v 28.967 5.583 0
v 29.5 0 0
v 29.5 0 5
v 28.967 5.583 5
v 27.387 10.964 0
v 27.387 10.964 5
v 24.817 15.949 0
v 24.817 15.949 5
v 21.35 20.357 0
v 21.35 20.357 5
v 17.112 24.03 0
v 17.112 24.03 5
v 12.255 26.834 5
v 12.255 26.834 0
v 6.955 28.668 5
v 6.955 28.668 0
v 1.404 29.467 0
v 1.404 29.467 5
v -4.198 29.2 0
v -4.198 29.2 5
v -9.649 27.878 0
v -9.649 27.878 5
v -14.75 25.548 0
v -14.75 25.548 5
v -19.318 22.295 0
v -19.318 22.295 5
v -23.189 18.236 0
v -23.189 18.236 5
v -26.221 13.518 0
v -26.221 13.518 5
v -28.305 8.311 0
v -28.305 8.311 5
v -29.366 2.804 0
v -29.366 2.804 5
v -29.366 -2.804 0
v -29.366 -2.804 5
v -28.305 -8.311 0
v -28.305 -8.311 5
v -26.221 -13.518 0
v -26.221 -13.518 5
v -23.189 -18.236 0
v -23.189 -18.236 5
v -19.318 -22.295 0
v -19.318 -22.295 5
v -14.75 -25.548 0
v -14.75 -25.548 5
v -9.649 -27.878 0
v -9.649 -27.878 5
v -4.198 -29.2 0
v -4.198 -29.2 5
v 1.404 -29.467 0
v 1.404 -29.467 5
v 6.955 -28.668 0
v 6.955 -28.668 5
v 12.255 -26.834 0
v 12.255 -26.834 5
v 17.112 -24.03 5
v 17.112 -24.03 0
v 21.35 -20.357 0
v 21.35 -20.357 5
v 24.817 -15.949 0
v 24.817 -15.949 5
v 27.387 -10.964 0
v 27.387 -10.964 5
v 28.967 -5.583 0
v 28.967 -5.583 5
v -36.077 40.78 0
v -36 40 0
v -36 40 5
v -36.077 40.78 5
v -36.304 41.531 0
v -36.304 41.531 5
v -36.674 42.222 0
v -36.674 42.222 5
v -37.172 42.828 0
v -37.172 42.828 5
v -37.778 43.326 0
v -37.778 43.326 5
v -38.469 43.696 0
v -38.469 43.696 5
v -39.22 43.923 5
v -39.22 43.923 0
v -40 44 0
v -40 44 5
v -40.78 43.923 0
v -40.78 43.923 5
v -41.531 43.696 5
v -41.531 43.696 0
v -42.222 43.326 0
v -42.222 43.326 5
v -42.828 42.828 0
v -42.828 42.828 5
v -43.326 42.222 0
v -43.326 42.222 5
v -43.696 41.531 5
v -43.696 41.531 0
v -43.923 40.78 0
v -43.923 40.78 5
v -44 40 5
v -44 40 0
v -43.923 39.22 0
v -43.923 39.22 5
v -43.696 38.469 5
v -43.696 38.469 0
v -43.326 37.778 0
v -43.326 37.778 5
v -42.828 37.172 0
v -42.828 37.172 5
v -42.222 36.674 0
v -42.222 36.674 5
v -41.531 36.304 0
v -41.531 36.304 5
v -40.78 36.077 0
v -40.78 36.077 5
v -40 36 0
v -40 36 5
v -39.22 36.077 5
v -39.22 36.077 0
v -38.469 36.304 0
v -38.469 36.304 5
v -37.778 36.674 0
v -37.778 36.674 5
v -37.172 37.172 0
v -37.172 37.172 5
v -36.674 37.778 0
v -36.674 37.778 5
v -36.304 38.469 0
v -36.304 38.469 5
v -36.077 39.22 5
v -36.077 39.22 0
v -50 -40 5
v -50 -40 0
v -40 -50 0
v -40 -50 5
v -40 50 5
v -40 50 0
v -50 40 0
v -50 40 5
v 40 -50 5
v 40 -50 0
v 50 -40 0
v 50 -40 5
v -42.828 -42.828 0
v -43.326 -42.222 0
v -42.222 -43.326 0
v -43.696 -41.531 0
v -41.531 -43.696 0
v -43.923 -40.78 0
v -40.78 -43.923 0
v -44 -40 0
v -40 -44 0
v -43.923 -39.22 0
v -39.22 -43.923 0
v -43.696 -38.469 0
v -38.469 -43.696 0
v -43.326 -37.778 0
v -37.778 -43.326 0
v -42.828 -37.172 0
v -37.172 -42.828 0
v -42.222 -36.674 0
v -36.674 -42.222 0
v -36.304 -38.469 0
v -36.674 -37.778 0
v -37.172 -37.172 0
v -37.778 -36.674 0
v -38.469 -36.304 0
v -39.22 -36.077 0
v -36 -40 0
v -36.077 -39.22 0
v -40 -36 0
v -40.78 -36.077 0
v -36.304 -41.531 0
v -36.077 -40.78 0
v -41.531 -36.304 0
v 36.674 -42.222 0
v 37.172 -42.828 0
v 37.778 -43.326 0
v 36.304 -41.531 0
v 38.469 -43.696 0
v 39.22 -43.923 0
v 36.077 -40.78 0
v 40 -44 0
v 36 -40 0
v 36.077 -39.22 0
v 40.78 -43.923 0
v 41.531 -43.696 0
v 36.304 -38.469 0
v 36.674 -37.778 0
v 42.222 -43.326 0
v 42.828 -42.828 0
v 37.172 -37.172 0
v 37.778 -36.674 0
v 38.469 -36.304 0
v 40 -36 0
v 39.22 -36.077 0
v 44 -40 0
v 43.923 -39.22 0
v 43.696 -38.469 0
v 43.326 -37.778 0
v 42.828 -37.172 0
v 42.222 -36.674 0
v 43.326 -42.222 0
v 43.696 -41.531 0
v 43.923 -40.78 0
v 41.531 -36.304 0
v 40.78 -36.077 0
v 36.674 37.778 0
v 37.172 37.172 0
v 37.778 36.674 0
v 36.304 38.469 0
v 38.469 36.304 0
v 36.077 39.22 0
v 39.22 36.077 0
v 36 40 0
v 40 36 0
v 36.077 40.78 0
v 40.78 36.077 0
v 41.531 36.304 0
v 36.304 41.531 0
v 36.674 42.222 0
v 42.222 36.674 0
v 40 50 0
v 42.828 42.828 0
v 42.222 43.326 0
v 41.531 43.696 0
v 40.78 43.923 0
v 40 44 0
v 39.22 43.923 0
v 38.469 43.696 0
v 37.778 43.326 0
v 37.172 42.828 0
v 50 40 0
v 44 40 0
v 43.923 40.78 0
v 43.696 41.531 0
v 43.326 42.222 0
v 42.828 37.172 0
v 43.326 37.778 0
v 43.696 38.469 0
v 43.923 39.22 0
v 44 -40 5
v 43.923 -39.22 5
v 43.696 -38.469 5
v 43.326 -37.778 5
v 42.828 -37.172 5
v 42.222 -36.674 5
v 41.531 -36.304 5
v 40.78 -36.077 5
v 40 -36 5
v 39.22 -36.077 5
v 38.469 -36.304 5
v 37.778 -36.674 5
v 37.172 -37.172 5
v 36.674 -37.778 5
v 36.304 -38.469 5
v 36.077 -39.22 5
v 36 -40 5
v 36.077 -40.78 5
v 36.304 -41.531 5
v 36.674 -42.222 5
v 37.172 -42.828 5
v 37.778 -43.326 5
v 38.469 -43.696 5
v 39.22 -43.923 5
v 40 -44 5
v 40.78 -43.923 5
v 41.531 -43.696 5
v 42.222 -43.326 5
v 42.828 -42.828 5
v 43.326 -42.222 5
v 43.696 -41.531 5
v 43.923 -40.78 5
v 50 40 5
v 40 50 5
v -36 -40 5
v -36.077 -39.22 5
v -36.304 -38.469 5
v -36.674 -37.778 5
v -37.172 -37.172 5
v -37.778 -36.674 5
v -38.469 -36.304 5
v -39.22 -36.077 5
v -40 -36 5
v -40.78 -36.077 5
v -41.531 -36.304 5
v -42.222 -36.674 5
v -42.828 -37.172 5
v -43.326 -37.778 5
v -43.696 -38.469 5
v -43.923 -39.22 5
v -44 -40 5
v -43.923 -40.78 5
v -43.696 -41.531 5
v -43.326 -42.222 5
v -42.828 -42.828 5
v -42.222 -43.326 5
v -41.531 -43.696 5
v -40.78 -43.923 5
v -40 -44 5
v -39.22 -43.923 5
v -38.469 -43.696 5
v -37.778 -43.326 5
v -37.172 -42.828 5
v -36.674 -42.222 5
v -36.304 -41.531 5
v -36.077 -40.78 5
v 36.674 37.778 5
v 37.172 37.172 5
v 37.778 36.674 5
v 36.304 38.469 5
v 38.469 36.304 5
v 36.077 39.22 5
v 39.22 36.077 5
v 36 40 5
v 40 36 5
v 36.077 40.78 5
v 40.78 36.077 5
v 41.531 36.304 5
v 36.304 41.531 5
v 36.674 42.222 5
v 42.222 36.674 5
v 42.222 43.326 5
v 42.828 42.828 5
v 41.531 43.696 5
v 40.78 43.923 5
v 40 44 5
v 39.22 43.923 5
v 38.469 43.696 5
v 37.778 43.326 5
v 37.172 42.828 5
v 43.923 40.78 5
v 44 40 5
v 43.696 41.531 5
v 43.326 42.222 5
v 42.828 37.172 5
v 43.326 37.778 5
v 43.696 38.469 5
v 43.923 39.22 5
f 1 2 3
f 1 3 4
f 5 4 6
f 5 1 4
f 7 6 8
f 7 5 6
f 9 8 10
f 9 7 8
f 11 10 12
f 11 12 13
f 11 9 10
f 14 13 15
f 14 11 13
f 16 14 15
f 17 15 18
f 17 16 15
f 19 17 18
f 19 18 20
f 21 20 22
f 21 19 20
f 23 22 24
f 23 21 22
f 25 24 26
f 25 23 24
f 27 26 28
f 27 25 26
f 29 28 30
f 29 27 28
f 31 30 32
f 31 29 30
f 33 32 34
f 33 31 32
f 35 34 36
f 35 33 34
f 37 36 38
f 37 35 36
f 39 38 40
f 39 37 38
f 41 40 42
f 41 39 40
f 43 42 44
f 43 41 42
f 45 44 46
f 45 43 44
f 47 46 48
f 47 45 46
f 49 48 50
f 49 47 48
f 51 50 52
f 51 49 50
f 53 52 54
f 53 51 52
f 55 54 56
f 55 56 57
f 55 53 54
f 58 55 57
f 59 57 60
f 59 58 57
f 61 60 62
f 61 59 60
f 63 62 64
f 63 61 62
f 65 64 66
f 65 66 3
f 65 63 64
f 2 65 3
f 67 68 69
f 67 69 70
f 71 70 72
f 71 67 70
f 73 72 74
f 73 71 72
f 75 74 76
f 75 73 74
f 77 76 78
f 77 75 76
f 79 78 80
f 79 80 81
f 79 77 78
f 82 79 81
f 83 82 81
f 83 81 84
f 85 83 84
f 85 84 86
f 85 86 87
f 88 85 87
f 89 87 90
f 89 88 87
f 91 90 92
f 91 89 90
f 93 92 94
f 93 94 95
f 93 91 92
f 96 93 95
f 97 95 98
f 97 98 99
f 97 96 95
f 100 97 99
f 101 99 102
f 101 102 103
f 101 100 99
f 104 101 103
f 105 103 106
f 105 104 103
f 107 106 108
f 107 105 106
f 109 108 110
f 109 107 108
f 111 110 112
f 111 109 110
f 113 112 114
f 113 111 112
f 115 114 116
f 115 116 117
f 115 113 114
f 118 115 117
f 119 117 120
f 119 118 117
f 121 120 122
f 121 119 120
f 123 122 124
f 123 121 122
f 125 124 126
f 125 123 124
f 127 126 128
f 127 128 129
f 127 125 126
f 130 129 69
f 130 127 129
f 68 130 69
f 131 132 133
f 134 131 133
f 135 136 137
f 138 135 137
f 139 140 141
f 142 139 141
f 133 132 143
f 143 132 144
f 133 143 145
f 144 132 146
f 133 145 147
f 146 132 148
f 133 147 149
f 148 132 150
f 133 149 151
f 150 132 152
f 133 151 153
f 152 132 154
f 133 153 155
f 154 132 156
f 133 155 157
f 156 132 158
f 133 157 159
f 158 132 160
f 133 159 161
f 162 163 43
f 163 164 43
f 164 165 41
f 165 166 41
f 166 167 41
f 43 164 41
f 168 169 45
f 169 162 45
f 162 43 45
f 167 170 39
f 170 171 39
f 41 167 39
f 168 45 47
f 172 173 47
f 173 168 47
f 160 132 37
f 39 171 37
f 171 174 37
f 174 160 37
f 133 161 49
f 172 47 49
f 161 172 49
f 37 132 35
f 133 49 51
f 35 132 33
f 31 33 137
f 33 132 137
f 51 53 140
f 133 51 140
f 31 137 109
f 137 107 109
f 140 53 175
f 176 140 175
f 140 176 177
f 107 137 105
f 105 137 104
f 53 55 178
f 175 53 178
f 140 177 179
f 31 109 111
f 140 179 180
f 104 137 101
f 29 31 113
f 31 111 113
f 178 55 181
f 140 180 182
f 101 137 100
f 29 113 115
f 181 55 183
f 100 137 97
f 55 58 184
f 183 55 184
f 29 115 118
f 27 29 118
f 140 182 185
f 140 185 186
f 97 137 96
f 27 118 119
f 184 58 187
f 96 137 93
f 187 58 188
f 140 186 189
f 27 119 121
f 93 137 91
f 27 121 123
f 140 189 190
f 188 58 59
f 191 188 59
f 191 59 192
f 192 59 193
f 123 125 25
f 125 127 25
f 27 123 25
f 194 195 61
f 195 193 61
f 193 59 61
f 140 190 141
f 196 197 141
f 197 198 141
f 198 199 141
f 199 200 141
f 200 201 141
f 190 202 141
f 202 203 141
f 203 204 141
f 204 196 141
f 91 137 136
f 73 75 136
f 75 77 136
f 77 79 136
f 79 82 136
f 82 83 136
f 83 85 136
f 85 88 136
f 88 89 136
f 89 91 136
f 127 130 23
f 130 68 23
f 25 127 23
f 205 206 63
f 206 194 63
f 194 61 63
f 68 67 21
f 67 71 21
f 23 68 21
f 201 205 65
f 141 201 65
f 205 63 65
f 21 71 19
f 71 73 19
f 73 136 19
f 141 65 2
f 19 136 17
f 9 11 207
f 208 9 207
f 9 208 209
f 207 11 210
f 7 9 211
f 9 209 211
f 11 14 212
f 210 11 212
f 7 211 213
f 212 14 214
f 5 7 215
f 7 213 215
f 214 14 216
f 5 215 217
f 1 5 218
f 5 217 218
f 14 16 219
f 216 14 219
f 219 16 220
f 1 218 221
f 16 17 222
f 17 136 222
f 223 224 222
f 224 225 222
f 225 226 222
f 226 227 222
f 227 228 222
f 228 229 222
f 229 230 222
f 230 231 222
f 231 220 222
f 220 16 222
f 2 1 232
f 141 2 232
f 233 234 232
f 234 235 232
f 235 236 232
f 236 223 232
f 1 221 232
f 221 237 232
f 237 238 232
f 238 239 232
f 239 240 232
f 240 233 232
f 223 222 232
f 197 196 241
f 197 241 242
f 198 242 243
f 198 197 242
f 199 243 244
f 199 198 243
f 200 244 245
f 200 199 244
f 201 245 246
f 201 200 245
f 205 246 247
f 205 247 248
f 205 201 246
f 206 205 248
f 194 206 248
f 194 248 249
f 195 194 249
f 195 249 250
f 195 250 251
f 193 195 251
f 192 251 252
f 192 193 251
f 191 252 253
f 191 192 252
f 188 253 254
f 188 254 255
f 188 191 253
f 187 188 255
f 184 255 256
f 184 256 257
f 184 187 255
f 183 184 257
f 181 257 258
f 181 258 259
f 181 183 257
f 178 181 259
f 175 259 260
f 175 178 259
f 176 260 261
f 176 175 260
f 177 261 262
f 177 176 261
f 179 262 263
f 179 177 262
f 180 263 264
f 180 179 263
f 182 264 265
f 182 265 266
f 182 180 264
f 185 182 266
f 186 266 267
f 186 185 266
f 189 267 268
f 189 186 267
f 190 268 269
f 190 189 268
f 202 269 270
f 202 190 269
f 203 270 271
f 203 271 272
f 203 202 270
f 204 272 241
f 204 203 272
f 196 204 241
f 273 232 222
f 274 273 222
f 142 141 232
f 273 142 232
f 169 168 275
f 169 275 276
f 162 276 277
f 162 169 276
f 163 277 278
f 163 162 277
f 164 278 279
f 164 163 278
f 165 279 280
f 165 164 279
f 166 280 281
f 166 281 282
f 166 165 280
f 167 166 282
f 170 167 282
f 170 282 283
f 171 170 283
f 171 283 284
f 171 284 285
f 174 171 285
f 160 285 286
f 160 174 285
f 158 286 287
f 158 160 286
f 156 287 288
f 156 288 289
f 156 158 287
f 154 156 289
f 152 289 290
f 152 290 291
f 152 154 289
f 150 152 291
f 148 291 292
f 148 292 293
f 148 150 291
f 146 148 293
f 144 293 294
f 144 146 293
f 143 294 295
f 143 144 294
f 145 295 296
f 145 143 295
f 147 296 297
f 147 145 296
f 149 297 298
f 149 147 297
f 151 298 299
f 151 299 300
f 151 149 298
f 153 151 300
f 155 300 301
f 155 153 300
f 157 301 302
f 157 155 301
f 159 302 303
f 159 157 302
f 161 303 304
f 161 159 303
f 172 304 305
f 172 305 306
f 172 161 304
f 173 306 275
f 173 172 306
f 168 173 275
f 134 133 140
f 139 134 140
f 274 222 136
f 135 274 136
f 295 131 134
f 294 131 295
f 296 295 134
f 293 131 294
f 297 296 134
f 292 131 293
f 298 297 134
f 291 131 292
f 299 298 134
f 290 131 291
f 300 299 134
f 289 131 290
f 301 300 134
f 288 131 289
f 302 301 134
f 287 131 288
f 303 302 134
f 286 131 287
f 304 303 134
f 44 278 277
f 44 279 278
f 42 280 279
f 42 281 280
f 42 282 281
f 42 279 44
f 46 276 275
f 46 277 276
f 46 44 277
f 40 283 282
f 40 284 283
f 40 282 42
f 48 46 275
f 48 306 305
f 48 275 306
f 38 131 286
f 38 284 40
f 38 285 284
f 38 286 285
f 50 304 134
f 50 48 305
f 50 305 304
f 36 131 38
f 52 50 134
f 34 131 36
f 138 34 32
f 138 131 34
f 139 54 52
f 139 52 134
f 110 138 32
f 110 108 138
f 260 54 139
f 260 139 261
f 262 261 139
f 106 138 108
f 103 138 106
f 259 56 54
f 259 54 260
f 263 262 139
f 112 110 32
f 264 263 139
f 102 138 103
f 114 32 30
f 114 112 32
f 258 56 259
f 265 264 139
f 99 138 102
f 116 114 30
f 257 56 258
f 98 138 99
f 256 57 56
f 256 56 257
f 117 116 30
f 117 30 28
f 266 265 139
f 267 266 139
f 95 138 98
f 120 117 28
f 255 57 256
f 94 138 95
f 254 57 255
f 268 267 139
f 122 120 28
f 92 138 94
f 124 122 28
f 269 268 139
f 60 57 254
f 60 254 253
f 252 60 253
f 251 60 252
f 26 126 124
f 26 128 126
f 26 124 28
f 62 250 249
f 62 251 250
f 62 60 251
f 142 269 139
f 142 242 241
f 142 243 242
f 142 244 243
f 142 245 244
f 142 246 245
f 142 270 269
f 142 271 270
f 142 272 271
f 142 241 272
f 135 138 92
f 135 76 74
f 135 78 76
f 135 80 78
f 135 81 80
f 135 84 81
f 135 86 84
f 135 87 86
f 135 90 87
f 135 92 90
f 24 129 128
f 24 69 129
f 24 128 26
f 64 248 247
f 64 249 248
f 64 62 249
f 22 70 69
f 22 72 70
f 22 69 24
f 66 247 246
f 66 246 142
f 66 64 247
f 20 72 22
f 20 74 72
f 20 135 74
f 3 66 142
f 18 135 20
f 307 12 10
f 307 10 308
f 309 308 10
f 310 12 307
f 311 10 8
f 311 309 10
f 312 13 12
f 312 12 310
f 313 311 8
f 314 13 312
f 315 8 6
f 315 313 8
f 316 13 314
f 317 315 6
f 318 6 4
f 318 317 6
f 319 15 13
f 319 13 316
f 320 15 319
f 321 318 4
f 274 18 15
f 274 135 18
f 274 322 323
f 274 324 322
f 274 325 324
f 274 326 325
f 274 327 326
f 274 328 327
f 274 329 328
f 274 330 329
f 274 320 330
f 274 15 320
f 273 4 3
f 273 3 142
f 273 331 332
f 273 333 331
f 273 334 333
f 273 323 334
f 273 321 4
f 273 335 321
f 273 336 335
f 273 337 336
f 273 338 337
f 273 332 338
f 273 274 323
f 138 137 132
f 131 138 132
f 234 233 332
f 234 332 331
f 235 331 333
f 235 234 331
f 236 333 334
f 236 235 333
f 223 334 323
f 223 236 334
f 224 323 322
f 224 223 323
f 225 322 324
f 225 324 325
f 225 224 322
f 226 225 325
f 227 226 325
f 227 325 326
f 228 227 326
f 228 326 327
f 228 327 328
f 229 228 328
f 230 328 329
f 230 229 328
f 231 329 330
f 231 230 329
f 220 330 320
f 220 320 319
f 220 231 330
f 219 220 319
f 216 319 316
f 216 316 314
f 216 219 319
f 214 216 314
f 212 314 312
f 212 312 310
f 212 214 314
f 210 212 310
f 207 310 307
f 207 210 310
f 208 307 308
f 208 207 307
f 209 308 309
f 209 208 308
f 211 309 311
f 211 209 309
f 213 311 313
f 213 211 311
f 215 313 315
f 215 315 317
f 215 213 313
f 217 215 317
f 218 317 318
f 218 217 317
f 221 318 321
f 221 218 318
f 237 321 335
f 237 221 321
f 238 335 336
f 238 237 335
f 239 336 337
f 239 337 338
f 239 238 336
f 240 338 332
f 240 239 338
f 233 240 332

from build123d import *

# Parameters (mm, degrees)
SKETCH2_R           = 29.5
SKETCH2_R_2         = 4
BOSS_EXTRUDE2_DEPTH = 5


with BuildPart() as part:
    # Sketch2 → Boss-Extrude2 (new body)
    with BuildSketch(Plane.XY):
        Polygon((-40, 50), (-50, 40), (-50, -40), (-40, -50), (40, -50), (50, -40), (50, 40), (40, 50), align=None)
        Circle(SKETCH2_R, mode=Mode.SUBTRACT)
        with Locations((-40, 40)):
            Circle(SKETCH2_R_2, mode=Mode.SUBTRACT)
        with Locations((40, 40)):
            Circle(SKETCH2_R_2, mode=Mode.SUBTRACT)
        with Locations((40, -40)):
            Circle(SKETCH2_R_2, mode=Mode.SUBTRACT)
        with Locations((-40, -40)):
            Circle(SKETCH2_R_2, mode=Mode.SUBTRACT)
    extrude(amount=BOSS_EXTRUDE2_DEPTH)


solid = part.part
